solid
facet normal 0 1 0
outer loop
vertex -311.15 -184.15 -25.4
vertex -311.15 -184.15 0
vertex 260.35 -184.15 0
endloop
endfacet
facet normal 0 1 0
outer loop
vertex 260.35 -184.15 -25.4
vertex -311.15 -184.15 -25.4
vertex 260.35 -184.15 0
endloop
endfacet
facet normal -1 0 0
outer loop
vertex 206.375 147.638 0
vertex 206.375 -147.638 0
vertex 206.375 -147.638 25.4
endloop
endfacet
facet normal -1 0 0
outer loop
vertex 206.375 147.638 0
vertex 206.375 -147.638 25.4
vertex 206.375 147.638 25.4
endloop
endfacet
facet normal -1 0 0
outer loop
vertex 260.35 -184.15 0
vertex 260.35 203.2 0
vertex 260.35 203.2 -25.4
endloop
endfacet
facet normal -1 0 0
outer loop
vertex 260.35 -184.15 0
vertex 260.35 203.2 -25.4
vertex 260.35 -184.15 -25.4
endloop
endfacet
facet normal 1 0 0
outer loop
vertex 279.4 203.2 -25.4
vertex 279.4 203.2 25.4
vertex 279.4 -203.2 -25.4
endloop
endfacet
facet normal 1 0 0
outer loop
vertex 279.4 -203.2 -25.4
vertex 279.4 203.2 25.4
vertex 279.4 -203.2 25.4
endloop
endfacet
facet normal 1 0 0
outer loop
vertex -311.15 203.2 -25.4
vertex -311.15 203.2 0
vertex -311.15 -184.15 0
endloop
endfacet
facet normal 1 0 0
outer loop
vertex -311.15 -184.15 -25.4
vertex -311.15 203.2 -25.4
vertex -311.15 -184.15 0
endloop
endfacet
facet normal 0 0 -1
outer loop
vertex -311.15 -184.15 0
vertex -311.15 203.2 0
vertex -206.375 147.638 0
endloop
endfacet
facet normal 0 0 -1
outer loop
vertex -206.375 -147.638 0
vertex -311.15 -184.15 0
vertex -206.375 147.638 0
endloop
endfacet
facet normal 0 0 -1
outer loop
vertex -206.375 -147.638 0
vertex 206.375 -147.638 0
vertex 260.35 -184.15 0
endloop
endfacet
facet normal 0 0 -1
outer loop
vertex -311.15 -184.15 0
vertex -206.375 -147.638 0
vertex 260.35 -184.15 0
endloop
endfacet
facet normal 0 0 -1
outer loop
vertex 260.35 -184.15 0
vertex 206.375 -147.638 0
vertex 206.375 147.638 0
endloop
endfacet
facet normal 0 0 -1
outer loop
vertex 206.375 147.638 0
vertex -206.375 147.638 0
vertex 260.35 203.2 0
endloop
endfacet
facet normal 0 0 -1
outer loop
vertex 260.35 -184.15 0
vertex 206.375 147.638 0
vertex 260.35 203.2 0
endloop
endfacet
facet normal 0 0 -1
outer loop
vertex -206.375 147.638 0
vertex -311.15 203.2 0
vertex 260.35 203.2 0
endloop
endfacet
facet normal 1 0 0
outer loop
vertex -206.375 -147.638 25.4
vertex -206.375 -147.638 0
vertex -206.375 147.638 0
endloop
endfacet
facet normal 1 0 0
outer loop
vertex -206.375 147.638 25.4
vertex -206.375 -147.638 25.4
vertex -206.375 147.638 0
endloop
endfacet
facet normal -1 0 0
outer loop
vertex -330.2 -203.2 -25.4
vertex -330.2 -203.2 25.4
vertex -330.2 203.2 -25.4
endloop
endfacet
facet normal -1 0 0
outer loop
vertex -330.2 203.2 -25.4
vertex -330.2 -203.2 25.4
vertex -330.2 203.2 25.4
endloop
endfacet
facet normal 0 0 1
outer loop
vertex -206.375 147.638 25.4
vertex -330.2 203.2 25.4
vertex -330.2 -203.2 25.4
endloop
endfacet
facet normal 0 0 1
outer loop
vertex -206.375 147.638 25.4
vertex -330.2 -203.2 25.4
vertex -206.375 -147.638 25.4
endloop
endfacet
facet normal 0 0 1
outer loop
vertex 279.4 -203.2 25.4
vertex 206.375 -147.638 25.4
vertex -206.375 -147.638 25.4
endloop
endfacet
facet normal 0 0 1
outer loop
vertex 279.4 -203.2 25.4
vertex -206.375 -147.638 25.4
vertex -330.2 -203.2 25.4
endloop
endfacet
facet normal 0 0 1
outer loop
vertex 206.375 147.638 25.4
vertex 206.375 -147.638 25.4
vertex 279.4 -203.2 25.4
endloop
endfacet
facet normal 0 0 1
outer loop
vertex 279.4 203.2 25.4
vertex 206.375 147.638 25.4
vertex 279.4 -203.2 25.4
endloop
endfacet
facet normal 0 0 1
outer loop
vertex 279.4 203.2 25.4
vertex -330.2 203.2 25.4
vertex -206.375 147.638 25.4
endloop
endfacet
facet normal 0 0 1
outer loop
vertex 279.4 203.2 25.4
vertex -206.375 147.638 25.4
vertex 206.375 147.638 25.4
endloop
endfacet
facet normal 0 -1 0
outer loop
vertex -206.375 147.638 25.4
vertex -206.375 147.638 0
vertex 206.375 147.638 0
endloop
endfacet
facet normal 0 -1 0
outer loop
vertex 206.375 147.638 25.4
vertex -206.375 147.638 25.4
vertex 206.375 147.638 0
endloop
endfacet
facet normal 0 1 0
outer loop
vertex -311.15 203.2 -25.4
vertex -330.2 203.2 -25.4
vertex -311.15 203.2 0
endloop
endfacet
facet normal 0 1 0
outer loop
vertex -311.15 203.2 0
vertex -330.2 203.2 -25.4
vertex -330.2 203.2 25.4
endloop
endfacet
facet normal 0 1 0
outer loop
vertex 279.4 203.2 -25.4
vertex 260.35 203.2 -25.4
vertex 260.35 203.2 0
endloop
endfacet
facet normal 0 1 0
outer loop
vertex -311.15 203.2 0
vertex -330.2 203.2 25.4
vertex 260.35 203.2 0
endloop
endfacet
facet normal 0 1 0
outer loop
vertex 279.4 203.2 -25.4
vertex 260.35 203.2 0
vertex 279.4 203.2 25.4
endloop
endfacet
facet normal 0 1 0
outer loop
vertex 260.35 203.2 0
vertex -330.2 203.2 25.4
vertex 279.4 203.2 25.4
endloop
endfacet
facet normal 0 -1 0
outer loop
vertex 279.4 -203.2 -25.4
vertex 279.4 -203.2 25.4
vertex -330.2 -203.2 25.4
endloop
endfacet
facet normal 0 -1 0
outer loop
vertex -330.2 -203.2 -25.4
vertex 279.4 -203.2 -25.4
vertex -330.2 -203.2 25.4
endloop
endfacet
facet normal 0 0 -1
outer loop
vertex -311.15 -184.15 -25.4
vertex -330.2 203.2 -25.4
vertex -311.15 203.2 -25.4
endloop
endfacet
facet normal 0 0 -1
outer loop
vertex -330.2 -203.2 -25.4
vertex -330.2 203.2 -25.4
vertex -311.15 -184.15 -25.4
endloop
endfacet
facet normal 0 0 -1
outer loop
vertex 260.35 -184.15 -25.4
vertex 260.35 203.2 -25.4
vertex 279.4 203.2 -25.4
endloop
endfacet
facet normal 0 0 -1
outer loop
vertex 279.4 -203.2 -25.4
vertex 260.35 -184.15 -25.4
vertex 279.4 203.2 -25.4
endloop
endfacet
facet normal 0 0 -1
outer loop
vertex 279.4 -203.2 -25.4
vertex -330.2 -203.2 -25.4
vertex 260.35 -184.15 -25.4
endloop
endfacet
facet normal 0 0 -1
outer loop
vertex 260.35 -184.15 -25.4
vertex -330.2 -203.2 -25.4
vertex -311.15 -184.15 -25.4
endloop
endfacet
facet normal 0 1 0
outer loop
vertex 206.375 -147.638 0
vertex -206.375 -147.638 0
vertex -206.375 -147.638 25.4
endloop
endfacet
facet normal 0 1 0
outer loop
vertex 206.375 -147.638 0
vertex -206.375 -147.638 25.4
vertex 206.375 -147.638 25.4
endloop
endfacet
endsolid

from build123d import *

# Parameters (mm, degrees)
F0_W     = 412.75
F0_H     = 295.275
F1_DEPTH = 25.4
F2_W     = 19.05
F2_H     = 387.35
F3_DEPTH = 25.4


with BuildPart() as f1:
    # F0 (on Top) → F1 (new body)
    with BuildSketch(Plane.XY):
        Polygon((279.4, -203.2), (279.4, 203.2), (-279.4, 203.2), (-330.2, 203.2), (-330.2, -203.2), (-279.4, -203.2), align=None)
        Rectangle(F0_W, F0_H, mode=Mode.SUBTRACT)
    extrude(amount=F1_DEPTH)

    # F2 (on face) → F3 (join)
    with BuildSketch(Plane(origin=(0, 0, 0), x_dir=(1, 0, 0), z_dir=(0, 0, -1))):
        Polygon((279.4, 203.2), (-330.2, 203.2), (-330.2, 184.15), (-311.15, 184.15), (260.35, 184.15), (279.4, 184.15), align=None)
        with Locations((269.875, -9.525)):
            Rectangle(F2_W, F2_H)
        with Locations((-320.675, -9.525)):
            Rectangle(F2_W, F2_H)
    extrude(amount=F3_DEPTH)


solid = f1.part
